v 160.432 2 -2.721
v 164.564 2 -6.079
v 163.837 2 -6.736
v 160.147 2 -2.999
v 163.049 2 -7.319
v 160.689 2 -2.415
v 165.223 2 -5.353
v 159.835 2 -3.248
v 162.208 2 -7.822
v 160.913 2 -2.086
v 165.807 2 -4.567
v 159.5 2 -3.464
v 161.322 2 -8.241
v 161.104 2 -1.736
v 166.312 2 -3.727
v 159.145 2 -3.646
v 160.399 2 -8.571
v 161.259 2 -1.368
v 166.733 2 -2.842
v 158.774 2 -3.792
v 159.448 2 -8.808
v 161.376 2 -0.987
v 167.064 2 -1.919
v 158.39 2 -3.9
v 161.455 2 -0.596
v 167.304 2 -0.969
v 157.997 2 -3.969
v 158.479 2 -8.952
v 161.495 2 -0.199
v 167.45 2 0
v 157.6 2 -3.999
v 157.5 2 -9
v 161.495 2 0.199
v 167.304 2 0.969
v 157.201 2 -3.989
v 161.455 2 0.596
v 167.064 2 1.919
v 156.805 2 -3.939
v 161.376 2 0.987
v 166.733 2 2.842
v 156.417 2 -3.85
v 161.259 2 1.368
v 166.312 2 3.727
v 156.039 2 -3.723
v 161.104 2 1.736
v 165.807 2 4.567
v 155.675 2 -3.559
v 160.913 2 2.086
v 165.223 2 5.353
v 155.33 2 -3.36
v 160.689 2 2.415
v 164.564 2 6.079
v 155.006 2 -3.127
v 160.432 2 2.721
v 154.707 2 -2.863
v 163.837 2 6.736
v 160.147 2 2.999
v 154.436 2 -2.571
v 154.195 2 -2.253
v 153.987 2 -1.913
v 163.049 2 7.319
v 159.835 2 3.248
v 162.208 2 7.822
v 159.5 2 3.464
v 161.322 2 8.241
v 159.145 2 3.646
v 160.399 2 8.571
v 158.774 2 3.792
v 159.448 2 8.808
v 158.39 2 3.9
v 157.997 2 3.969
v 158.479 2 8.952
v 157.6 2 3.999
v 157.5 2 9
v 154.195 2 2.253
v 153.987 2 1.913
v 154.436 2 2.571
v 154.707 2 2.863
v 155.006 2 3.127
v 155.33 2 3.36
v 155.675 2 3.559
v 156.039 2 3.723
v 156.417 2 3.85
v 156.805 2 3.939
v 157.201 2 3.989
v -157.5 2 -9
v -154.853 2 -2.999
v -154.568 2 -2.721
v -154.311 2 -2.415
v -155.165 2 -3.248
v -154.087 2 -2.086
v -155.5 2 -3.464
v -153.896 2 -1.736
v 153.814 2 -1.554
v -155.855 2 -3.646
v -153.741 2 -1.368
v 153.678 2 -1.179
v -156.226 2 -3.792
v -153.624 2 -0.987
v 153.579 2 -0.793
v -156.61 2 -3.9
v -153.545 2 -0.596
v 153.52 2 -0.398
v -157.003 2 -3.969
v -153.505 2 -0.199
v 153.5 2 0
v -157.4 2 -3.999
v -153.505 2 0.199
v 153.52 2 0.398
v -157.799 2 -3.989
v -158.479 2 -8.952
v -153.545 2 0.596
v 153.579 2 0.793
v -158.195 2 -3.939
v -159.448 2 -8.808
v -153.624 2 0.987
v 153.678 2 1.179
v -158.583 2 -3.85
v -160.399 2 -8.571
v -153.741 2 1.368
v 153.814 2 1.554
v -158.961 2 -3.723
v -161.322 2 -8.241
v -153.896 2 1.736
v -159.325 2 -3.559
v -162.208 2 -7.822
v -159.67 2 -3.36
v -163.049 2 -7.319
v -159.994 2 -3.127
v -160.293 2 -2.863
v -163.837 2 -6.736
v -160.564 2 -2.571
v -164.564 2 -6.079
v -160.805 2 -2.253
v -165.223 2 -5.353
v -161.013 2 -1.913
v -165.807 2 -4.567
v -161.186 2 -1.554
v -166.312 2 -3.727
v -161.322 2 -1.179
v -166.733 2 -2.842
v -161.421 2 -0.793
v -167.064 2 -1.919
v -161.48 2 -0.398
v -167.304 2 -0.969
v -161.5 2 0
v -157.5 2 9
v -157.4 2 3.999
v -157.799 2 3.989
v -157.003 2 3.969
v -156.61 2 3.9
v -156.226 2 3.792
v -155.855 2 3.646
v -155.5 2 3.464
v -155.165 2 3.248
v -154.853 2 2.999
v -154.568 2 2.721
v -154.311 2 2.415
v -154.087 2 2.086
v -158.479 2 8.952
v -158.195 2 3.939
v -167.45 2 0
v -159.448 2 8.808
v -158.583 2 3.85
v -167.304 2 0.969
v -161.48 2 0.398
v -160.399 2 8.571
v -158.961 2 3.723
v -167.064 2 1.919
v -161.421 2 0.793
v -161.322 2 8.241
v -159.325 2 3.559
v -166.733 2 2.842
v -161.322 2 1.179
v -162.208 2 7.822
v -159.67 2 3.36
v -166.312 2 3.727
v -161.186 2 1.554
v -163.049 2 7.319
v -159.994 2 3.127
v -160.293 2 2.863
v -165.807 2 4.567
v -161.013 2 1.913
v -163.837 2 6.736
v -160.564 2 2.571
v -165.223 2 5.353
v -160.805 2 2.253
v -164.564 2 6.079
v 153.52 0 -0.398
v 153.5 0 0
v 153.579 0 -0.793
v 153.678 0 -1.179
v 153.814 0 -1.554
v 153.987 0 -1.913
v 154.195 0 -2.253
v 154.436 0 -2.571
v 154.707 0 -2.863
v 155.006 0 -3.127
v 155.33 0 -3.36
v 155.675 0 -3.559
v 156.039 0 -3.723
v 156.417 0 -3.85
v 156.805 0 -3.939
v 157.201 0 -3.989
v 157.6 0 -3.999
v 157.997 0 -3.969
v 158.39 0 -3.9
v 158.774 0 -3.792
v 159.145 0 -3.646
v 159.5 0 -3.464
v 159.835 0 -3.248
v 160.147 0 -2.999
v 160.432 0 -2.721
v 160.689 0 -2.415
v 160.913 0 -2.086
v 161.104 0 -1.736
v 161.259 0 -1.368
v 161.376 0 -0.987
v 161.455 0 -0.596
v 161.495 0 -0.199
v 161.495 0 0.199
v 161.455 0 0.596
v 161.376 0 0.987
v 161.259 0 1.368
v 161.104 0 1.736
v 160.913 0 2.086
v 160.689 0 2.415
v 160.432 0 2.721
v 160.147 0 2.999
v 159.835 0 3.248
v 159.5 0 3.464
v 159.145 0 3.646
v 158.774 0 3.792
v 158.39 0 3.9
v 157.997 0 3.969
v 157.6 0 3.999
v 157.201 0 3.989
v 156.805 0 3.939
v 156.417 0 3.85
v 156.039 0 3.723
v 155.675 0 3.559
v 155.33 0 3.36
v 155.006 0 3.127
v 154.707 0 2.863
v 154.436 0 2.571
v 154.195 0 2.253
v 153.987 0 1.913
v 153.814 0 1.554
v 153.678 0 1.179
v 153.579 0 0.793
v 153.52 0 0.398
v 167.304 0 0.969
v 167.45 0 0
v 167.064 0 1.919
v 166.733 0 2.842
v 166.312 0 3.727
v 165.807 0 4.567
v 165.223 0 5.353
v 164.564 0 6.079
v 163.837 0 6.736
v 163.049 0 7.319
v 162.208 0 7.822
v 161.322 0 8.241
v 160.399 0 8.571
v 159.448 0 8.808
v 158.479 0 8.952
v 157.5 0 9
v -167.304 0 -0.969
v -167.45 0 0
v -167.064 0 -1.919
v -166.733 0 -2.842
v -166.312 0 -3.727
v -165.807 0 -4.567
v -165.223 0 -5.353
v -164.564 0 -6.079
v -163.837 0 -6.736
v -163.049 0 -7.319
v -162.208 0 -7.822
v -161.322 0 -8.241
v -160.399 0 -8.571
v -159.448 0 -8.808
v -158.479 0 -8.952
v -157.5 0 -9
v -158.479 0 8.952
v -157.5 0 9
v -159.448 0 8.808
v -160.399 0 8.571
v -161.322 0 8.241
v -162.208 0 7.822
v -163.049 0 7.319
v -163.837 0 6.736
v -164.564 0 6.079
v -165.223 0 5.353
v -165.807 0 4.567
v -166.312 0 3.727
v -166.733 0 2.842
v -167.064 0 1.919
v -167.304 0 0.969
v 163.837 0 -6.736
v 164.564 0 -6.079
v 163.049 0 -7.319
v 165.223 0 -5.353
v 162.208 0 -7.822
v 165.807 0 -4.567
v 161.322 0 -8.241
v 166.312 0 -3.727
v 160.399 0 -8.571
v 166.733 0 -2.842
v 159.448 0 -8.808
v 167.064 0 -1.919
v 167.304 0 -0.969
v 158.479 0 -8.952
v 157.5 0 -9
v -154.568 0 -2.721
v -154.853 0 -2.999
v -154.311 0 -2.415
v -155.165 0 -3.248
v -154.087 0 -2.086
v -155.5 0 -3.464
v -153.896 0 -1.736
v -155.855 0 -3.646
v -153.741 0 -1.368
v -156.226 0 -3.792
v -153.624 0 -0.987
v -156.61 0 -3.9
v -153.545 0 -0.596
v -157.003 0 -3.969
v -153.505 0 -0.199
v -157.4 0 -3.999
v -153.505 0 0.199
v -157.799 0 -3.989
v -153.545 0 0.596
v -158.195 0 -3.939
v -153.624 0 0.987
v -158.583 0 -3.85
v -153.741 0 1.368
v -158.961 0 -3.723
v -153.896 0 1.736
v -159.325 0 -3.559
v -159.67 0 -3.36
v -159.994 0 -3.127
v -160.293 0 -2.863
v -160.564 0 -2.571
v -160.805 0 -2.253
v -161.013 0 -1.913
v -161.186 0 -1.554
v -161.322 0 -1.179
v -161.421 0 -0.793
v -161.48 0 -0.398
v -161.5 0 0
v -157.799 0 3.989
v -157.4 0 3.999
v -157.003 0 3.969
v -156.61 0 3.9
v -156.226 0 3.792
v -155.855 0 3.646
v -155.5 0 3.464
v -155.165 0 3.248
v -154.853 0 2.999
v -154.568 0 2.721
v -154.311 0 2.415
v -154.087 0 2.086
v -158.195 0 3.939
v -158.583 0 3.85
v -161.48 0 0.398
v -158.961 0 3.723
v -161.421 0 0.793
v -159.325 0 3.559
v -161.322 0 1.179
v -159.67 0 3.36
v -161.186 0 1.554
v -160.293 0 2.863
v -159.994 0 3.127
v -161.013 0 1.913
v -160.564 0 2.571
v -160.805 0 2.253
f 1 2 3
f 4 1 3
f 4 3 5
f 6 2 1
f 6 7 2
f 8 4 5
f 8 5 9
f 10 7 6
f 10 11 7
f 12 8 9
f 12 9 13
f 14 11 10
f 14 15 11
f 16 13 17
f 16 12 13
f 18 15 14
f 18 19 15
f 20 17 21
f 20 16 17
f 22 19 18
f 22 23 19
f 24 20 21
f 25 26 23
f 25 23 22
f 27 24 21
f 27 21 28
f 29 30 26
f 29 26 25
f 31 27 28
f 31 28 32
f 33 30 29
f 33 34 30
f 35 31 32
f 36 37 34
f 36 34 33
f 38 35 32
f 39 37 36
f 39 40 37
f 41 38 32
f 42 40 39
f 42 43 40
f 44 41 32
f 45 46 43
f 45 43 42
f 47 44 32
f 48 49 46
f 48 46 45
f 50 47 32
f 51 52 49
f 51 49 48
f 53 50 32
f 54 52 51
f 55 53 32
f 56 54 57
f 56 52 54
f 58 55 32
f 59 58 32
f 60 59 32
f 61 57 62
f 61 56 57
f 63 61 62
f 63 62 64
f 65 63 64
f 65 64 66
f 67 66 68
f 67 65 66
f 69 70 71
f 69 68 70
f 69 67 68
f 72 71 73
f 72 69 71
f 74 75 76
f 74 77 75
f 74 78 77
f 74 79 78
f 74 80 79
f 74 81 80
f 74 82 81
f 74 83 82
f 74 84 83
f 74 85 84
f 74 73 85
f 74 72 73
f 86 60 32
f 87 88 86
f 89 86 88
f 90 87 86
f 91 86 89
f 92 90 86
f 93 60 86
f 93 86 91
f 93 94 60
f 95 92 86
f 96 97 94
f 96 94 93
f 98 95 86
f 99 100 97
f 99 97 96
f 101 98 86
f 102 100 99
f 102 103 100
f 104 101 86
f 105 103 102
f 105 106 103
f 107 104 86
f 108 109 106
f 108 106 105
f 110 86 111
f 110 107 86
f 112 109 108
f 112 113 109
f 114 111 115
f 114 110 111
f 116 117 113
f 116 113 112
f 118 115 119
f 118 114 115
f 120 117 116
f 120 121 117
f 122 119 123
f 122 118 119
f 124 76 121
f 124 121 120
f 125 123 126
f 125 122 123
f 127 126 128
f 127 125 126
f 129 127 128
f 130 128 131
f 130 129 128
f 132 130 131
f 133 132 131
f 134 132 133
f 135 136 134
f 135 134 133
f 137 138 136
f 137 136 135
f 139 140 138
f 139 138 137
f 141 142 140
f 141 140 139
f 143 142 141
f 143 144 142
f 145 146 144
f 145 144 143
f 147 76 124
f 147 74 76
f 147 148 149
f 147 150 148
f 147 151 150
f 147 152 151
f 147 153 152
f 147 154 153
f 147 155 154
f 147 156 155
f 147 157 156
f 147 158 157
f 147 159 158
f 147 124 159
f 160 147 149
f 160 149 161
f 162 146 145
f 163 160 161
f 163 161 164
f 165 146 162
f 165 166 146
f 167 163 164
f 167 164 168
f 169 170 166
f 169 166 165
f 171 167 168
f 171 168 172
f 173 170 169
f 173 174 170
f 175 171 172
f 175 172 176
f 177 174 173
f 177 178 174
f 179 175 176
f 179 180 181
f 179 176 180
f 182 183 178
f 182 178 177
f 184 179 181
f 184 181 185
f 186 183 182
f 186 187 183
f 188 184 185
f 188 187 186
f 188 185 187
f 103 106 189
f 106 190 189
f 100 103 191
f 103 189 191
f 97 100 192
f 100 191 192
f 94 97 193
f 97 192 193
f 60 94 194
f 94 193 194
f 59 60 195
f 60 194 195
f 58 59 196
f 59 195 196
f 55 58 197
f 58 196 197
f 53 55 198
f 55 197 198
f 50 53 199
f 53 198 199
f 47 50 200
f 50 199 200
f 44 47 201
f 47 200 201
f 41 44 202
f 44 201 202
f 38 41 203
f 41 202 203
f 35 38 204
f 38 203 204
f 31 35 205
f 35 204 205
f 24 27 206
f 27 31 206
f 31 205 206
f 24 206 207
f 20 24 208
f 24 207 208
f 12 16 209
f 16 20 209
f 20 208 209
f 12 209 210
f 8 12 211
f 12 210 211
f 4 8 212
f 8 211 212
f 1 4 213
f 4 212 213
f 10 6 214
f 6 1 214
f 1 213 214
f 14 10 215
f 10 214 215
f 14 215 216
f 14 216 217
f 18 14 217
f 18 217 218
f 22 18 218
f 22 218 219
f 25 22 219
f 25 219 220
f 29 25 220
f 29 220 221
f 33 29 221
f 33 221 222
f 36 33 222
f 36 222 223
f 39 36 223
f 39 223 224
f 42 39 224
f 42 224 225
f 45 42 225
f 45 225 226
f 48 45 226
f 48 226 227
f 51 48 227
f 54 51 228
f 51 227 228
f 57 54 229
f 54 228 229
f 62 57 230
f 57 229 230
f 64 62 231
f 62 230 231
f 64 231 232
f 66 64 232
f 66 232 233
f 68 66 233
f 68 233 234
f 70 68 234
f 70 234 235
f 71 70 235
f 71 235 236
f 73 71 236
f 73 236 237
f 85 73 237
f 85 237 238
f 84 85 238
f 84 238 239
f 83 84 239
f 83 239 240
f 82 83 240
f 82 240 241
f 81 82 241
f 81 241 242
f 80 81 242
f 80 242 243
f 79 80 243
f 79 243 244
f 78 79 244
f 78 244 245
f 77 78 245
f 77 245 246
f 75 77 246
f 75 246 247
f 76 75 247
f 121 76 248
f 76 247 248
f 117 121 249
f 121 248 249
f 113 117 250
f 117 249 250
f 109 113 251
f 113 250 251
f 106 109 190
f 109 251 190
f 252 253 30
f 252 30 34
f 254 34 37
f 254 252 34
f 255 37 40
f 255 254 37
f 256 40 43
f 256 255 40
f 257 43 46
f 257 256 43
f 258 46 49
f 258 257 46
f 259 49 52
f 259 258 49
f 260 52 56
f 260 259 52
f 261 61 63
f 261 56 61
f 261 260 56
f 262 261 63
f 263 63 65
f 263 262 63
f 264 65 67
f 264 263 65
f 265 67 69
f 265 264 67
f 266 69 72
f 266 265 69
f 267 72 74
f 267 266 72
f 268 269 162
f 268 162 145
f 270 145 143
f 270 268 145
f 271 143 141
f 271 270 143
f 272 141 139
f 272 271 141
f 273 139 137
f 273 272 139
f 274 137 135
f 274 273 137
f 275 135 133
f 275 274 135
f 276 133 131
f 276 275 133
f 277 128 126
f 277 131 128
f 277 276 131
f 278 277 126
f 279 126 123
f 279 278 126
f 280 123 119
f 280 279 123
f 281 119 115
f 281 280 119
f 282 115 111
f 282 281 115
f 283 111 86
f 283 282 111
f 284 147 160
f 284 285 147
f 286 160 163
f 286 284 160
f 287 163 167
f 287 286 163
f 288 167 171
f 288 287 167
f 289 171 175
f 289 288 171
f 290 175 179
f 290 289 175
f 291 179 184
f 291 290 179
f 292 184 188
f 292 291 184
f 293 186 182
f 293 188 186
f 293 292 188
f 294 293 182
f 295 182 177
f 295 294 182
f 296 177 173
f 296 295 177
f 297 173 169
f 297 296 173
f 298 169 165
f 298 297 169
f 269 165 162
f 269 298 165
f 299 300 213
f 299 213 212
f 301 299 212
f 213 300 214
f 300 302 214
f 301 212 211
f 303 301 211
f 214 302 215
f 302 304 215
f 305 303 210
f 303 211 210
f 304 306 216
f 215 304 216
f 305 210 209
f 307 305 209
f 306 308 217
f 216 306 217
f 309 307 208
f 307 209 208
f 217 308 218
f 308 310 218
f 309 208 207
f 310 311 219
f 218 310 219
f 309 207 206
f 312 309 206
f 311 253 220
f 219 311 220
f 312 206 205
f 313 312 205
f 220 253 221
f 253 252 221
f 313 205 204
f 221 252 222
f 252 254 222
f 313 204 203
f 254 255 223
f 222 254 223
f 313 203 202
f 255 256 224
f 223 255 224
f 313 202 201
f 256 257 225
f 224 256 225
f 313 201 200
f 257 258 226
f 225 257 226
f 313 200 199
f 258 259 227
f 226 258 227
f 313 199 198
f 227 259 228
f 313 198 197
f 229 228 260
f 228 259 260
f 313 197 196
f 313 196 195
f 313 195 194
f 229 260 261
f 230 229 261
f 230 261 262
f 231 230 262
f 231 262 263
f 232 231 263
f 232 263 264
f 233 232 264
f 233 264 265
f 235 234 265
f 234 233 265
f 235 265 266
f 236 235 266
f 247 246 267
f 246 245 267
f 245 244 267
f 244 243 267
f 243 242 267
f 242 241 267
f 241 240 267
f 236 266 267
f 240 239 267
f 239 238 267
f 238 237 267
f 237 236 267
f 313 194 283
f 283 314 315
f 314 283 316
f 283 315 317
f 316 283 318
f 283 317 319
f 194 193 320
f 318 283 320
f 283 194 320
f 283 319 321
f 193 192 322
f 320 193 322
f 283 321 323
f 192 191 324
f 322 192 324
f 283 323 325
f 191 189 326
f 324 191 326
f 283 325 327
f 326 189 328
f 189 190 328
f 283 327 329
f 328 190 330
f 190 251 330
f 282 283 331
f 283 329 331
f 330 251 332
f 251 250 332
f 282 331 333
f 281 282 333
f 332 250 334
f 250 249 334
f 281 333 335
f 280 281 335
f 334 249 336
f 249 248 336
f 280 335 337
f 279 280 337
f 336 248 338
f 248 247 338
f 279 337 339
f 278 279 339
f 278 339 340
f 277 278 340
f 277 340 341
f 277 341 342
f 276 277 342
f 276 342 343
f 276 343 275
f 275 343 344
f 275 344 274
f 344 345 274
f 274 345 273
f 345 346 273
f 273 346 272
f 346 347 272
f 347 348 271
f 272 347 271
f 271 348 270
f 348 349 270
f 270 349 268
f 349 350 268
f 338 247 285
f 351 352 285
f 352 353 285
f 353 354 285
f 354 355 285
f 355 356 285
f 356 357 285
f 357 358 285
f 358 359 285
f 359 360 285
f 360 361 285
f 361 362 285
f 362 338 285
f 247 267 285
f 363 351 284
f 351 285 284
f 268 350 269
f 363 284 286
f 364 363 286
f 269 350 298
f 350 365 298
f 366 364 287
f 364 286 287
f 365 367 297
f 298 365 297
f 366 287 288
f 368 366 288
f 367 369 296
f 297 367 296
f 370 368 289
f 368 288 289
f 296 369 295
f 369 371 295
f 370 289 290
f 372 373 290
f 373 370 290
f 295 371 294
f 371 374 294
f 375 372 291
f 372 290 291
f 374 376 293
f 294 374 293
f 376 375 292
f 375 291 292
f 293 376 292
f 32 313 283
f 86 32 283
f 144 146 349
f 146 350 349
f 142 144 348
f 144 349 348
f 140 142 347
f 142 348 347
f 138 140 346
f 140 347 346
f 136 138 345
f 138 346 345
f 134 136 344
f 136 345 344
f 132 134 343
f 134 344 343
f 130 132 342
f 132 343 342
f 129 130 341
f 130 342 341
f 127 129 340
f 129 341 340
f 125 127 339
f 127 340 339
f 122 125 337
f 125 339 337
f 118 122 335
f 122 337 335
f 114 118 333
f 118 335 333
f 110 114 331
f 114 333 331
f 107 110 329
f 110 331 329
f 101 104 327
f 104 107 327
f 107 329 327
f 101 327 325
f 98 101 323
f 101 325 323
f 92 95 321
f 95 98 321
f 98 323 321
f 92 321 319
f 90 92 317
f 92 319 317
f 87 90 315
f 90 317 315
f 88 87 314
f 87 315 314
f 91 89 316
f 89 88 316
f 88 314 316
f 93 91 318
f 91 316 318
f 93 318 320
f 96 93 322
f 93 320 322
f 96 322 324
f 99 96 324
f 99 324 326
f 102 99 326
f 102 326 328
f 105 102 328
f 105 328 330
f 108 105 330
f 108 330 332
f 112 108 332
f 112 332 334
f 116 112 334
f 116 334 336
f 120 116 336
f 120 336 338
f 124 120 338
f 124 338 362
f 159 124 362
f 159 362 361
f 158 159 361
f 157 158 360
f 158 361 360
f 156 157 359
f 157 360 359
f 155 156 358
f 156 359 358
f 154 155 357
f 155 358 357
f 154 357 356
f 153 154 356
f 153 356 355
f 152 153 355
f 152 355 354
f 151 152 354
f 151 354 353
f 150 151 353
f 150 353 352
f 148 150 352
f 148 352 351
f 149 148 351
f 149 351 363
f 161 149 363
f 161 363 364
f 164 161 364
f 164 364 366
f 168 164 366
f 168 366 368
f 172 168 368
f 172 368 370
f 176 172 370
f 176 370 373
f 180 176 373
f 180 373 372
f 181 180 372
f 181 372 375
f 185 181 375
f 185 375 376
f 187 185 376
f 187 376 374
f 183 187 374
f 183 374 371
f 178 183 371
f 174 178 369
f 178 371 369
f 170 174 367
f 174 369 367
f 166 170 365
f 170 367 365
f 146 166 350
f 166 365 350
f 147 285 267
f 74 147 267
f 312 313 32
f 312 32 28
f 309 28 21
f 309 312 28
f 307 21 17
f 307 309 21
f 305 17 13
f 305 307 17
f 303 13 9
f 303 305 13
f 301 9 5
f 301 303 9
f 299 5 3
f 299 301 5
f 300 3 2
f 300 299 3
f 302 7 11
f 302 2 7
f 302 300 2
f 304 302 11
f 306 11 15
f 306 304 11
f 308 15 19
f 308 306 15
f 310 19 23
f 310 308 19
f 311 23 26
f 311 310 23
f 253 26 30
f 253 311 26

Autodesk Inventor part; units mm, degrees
ref_plane "YZ Plane" through (0, 0, 0) normal (1, 0, 0) x (0, 1, 0)
ref_plane "XZ Plane" through (0, 0, 0) normal (0, 1, 0) x (-1, 0, 0)
ref_plane "XY Plane" through (0, 0, 0) normal (0, 0, 1) x (1, 0, 0)
sketch "Boceto1" plane through (0, 0, 0) normal (0, 1, 0) x (-1, 0, 0)
  line L0 (385.7227, 0) -> (-335.8409, 0) construction
  line L1 (0, 516.0097) -> (0, -537.3218) construction
  line L2 (-157.5, -9) -> (157.5, -9)
  line L3 (167.5, 1) -> (167.5, -1)
  line L4 (157.5, 9) -> (-157.5, 9)
  line L5 (-167.5, -1) -> (-167.5, 1)
  line L6 (-167.5, -9) -> (167.5, 9) construction
  line L7 (167.5, -9) -> (-167.5, 9) construction
  arc A0 (167.5, -1) -> (157.5, 9) centre (157.5, -1) ccw
  arc A1 (157.5, -9) -> (167.5, 1) centre (157.5, 1) ccw
  arc A2 (-167.5, 1) -> (-157.5, -9) centre (-157.5, 1) ccw
  arc A3 (-157.5, 9) -> (-167.5, -1) centre (-157.5, -1) ccw
  line L8 (157.5, 9) -> (157.5, -15.4925) construction
  circle A4 centre (157.5, 0) radius 4
  line L9 (-157.5, -9) -> (-157.5, 29.1929) construction
  circle A5 centre (-157.5, 0) radius 4
  point P0 (0, 0)
  point P1 (167.4499, 0)
  point P2 (-167.4499, 0)
  dimension "d0" = 18
  dimension "d1" = 335
  dimension "d2" = 10
  dimension "d3" = 8
  dimension "d4" = 8
extrude "Extrusión1" add sketch "Boceto1" along normal blind 2 contours A2 A3 L4 A0 A1 L2
